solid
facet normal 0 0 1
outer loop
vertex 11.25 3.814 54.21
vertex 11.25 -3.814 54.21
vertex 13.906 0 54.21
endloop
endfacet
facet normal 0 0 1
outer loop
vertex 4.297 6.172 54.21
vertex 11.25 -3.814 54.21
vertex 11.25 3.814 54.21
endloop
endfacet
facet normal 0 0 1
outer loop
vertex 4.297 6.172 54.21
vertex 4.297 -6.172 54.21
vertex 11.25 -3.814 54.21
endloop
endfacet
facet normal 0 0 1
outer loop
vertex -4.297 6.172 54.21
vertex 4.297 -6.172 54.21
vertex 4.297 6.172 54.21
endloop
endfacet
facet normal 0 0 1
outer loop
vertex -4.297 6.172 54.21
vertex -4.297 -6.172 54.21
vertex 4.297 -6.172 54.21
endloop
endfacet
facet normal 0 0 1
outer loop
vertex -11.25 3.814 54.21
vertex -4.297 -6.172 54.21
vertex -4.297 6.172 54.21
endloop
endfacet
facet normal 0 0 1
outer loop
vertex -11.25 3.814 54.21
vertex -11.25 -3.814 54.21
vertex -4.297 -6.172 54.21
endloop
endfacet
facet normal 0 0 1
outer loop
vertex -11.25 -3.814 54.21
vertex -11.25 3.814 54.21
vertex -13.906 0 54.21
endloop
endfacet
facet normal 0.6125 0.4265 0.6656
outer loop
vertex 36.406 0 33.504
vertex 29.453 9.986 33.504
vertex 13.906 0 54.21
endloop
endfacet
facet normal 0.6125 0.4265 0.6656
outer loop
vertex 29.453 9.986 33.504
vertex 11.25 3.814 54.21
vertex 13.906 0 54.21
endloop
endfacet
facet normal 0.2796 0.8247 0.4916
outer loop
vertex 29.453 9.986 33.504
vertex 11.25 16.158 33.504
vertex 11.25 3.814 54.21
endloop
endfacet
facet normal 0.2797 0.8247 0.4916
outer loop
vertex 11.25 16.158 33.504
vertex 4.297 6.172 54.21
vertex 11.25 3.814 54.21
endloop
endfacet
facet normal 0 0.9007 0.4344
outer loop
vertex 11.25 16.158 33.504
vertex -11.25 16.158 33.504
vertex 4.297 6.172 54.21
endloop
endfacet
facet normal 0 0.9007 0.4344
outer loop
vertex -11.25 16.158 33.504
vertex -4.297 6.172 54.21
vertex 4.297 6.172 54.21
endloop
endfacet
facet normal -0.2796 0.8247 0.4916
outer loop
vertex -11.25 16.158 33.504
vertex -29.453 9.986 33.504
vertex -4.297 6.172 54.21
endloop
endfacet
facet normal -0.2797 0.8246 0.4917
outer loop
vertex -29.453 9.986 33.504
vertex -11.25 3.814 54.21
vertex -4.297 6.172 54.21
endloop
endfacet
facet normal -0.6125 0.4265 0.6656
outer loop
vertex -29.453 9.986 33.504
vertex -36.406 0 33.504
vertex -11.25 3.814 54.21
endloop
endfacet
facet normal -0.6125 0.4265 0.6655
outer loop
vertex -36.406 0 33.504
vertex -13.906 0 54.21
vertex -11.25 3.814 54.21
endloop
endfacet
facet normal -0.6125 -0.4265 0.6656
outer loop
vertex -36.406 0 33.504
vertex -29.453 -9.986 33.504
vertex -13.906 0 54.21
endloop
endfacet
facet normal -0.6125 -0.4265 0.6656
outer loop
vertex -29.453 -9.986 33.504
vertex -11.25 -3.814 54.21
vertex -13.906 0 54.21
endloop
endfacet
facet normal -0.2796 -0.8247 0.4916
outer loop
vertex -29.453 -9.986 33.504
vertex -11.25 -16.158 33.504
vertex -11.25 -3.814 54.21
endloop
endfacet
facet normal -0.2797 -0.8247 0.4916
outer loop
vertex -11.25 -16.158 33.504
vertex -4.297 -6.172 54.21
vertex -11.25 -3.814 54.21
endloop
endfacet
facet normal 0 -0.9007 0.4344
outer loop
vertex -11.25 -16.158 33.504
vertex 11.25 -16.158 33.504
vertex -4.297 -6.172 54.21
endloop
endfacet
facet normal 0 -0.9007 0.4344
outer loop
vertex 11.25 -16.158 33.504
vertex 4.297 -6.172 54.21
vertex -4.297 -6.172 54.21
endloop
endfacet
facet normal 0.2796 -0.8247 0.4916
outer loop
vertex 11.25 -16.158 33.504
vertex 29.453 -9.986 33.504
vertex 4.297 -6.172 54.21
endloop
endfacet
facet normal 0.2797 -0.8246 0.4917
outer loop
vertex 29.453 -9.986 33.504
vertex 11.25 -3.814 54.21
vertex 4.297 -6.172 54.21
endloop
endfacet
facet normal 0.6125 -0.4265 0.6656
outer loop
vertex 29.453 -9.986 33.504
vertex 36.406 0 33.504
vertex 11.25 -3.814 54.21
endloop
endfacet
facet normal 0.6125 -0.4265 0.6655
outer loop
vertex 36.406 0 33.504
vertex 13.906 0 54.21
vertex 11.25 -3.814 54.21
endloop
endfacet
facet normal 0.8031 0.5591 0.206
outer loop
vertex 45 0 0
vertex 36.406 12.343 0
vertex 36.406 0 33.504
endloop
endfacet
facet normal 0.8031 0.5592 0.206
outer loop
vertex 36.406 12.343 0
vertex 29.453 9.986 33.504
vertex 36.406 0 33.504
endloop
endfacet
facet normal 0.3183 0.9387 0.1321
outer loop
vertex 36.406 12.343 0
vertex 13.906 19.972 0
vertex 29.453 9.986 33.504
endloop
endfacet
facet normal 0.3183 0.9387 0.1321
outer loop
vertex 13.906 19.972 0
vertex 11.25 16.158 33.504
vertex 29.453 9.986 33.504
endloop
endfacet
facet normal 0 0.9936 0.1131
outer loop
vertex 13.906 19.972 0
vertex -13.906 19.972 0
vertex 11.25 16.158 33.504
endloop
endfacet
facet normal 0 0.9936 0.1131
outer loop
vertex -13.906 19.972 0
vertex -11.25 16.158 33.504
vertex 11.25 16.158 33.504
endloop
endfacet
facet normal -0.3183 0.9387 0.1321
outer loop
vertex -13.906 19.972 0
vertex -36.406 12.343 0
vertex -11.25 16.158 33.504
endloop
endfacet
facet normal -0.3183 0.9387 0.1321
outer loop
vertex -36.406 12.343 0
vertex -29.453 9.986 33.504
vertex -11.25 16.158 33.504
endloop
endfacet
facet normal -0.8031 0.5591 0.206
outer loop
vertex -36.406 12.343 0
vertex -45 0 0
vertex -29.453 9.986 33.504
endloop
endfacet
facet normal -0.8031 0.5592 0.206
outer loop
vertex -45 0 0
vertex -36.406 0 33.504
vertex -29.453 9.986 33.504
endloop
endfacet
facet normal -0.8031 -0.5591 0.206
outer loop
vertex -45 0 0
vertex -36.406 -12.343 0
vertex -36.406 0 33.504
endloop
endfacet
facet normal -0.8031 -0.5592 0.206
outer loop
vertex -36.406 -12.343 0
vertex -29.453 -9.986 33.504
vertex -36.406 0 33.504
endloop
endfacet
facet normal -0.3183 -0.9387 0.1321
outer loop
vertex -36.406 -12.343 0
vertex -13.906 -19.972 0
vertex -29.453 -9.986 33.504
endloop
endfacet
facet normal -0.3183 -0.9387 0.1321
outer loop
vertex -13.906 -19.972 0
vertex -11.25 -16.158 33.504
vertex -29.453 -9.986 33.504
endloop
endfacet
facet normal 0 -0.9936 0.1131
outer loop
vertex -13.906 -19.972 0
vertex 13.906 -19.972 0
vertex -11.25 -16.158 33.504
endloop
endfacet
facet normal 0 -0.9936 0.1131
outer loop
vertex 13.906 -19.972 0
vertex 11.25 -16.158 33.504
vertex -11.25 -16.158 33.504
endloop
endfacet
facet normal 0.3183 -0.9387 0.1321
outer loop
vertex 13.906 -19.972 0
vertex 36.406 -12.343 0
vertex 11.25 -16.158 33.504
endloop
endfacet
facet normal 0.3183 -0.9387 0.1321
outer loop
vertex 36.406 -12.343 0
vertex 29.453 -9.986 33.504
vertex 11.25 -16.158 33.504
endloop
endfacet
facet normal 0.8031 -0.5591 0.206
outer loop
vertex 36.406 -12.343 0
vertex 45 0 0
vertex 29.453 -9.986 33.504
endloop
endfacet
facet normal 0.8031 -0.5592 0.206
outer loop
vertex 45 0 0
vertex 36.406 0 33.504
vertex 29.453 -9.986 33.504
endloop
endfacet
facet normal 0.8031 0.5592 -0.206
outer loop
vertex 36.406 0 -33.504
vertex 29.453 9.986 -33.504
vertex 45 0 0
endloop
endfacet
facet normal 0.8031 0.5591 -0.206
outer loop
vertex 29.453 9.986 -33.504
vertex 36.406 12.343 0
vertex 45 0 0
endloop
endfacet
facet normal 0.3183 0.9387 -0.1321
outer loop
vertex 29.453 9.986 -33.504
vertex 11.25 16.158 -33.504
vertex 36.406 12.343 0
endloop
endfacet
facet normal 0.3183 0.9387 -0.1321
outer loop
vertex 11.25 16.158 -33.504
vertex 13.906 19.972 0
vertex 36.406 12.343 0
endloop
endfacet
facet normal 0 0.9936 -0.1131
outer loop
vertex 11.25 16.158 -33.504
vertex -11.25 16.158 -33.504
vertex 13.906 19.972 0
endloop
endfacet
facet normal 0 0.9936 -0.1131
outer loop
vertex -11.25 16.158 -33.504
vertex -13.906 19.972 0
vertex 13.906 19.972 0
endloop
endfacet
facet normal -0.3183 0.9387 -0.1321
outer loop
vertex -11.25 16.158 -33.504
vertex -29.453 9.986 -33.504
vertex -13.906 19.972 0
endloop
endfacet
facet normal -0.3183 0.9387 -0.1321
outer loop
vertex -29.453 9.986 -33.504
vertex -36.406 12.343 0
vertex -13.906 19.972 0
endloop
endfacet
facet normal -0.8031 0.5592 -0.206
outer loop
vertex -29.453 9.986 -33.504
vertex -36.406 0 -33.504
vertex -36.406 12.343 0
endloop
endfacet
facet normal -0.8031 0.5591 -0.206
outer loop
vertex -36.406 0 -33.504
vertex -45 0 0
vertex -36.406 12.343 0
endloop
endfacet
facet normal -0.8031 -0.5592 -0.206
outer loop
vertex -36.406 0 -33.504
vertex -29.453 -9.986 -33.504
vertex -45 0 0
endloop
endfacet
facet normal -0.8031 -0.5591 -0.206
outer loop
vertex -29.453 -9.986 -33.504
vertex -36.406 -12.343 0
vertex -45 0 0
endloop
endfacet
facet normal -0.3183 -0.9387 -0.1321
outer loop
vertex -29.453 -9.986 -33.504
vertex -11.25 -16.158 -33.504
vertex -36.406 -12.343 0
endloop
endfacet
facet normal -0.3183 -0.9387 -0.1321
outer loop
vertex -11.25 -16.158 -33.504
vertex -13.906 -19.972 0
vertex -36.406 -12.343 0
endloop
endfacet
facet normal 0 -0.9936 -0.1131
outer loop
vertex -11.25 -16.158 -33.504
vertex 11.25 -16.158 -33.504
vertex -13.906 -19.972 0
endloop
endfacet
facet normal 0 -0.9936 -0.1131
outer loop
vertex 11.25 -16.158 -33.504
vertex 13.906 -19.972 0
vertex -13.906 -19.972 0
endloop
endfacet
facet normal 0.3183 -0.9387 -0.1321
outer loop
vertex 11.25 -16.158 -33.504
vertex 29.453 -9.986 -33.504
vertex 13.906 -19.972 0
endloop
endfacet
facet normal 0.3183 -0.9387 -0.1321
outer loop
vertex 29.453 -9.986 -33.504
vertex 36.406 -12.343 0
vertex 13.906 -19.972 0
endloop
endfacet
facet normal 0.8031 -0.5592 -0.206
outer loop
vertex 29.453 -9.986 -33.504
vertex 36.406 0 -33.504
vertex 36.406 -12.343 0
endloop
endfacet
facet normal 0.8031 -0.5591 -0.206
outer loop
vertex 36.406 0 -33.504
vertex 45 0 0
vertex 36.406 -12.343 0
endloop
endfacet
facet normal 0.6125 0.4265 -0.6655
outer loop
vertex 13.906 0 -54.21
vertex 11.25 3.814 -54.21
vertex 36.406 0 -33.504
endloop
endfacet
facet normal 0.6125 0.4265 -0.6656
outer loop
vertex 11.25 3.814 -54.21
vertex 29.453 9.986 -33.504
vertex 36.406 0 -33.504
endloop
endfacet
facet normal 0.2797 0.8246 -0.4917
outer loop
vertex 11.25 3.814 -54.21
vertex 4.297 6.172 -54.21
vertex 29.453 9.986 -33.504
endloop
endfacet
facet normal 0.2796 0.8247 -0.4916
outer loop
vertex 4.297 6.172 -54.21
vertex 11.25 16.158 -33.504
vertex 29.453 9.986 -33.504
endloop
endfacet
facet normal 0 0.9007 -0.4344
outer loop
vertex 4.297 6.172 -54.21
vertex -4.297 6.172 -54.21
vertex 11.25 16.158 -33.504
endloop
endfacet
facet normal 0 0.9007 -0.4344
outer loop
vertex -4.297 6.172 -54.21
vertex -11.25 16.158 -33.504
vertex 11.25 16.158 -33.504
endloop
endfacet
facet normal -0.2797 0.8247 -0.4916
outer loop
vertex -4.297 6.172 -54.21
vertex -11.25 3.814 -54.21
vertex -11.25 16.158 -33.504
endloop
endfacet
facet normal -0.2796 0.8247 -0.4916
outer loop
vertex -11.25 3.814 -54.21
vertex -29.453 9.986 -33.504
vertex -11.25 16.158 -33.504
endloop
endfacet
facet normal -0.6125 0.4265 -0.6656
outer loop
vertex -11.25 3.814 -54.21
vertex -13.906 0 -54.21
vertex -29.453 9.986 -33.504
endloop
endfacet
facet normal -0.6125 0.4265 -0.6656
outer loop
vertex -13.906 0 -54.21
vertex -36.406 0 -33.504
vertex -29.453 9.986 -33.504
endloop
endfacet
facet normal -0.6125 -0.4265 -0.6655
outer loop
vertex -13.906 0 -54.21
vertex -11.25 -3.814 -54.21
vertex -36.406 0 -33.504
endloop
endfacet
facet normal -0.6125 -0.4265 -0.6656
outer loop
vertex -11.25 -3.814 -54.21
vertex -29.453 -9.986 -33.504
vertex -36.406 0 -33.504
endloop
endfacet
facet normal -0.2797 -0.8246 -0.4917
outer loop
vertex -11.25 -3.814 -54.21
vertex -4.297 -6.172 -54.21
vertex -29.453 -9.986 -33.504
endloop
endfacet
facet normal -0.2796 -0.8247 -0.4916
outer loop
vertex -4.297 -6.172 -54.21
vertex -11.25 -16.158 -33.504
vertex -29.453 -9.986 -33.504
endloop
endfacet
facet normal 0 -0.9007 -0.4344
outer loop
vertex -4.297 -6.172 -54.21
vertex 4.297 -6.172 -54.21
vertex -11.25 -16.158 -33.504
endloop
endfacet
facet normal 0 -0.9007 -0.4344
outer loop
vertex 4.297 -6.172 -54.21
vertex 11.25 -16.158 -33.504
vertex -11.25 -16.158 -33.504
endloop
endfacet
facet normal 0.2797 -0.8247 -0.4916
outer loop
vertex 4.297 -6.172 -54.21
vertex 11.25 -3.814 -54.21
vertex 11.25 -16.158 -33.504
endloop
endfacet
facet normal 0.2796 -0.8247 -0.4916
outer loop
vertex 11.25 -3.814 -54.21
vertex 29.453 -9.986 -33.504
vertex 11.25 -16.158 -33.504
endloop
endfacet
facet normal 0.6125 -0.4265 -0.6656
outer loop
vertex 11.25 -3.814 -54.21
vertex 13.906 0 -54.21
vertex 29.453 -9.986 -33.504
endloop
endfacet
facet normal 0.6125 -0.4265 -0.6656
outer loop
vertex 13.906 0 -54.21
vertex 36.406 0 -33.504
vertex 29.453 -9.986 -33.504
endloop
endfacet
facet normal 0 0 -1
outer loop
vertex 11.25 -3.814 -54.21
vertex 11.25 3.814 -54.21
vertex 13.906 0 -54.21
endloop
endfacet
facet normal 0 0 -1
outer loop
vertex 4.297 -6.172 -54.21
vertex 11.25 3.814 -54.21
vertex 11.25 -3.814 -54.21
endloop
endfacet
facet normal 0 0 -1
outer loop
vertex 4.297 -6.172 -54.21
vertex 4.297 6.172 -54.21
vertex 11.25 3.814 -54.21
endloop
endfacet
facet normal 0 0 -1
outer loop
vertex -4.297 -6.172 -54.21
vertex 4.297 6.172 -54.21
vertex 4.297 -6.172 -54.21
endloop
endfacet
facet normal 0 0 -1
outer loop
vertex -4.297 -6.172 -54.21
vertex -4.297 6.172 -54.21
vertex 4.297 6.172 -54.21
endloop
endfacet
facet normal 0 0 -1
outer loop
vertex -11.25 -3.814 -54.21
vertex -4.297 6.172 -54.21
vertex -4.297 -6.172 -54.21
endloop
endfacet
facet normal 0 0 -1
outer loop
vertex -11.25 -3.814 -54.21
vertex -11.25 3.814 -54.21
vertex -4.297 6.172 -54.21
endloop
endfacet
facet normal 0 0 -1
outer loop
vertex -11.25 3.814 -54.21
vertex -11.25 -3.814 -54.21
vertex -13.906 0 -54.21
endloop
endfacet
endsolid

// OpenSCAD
// Generated by SolidPython 1.0.1 on 2020-07-29 00:46:51


scale(v = [15, 7, 19]) {
	sphere(r = 3);
}
/***********************************************
*********      SolidPython code:      **********
************************************************
 
# import packages: SolidPython
from solid import *
from solid.utils import *
from itertools import chain, combinations, permutations


class Resize:

    def __init__(self, scad_file):
        self.scad_file = scad_file
        #self.scad_file = import_scad(scad_file)
        # cone/cylinder param:
        self.r1 = 0
        self.r2 = 0
        self.h = 0
        # rectangular prism param:
        self.w = 0
        self.l = 0
        # ellipse param:
        self.r = 0

    # import OpenScad code (file name corresponds to shape)


    # classify shape + parameters
    def assign(self, param1, param2, param3):
        if self.scad_file == 'cone.scad':
            self.r1 = param1
            self.r2 = param2
            self.h = param3
        elif self.scad_file == 'cylinder.scad':
            self.r1 = param1
            self.r2 = param2
            self.h = param3
        elif self.scad_file == 'rectangularPrism.scad':
            self.h = param1
            self.l = param2
            self.w = param3
        else:
            self.r = param1
            self.h = param2

    # resize parameters
    def iterate(self):
        x = range(3, 20, 2)
        i = 1
        if self.scad_file == 'cone.scad':
            tempList = list(permutations(x, 2))
            for temp in tempList:
                param1 = temp[0]
                param2 = temp[1]
                filepath = 'produced_scad_files/' + 'cone' + str(param1) + '_' + str(param2) + '_' + '.scad'
                scad_render_to_file(cylinder(h=param1, r1=param2, r2=0), filepath)

        elif self.scad_file == 'cylinder.scad':
            tempList = list(permutations(x, 3))
            for temp in tempList:
                param1 = temp[0]
                param2 = temp[1]
                filepath = 'produced_scad_files/' + 'cylinder' + str(param1) + '_' + str(param2) + '_' + '.scad'
                scad_render_to_file(cylinder(h=param1, r1=param2, r2=param2), filepath)

        elif self.scad_file == 'rectangularPrism.scad':
            tempList = list(permutations(x, 3))
            for temp in tempList:
                param1 = temp[0]
                param2 = temp[1]
                param3 = temp[2]
                filepath = 'produced_scad_files/' + 'rectangularPrism' + str(param1) + '_' + str(param2) + '_' + str(
                    param3) + '.scad'
                scad_render_to_file(cube(size=(param1, param2, param3)), filepath)

        elif self.scad_file == 'ellipse.scad':
            tempList = list(permutations(x, 4))
            for temp in tempList:
                param1 = temp[0]
                param2 = temp[1]
                param3 = temp[2]
                param4 = temp[3]
                filepath = 'produced_scad_files/' + 'ellipse' + str(param1) + '_' + str(param2) + '_' + str(param3) + '_' + str(param4) + '.scad'
                scad_render_to_file(scale([param1, param2, param3])(sphere(r=param4)), filepath)

    def render_to_scadfile(self):
        scad_render_to_file(scad, 'example.scad') 
 
************************************************/
